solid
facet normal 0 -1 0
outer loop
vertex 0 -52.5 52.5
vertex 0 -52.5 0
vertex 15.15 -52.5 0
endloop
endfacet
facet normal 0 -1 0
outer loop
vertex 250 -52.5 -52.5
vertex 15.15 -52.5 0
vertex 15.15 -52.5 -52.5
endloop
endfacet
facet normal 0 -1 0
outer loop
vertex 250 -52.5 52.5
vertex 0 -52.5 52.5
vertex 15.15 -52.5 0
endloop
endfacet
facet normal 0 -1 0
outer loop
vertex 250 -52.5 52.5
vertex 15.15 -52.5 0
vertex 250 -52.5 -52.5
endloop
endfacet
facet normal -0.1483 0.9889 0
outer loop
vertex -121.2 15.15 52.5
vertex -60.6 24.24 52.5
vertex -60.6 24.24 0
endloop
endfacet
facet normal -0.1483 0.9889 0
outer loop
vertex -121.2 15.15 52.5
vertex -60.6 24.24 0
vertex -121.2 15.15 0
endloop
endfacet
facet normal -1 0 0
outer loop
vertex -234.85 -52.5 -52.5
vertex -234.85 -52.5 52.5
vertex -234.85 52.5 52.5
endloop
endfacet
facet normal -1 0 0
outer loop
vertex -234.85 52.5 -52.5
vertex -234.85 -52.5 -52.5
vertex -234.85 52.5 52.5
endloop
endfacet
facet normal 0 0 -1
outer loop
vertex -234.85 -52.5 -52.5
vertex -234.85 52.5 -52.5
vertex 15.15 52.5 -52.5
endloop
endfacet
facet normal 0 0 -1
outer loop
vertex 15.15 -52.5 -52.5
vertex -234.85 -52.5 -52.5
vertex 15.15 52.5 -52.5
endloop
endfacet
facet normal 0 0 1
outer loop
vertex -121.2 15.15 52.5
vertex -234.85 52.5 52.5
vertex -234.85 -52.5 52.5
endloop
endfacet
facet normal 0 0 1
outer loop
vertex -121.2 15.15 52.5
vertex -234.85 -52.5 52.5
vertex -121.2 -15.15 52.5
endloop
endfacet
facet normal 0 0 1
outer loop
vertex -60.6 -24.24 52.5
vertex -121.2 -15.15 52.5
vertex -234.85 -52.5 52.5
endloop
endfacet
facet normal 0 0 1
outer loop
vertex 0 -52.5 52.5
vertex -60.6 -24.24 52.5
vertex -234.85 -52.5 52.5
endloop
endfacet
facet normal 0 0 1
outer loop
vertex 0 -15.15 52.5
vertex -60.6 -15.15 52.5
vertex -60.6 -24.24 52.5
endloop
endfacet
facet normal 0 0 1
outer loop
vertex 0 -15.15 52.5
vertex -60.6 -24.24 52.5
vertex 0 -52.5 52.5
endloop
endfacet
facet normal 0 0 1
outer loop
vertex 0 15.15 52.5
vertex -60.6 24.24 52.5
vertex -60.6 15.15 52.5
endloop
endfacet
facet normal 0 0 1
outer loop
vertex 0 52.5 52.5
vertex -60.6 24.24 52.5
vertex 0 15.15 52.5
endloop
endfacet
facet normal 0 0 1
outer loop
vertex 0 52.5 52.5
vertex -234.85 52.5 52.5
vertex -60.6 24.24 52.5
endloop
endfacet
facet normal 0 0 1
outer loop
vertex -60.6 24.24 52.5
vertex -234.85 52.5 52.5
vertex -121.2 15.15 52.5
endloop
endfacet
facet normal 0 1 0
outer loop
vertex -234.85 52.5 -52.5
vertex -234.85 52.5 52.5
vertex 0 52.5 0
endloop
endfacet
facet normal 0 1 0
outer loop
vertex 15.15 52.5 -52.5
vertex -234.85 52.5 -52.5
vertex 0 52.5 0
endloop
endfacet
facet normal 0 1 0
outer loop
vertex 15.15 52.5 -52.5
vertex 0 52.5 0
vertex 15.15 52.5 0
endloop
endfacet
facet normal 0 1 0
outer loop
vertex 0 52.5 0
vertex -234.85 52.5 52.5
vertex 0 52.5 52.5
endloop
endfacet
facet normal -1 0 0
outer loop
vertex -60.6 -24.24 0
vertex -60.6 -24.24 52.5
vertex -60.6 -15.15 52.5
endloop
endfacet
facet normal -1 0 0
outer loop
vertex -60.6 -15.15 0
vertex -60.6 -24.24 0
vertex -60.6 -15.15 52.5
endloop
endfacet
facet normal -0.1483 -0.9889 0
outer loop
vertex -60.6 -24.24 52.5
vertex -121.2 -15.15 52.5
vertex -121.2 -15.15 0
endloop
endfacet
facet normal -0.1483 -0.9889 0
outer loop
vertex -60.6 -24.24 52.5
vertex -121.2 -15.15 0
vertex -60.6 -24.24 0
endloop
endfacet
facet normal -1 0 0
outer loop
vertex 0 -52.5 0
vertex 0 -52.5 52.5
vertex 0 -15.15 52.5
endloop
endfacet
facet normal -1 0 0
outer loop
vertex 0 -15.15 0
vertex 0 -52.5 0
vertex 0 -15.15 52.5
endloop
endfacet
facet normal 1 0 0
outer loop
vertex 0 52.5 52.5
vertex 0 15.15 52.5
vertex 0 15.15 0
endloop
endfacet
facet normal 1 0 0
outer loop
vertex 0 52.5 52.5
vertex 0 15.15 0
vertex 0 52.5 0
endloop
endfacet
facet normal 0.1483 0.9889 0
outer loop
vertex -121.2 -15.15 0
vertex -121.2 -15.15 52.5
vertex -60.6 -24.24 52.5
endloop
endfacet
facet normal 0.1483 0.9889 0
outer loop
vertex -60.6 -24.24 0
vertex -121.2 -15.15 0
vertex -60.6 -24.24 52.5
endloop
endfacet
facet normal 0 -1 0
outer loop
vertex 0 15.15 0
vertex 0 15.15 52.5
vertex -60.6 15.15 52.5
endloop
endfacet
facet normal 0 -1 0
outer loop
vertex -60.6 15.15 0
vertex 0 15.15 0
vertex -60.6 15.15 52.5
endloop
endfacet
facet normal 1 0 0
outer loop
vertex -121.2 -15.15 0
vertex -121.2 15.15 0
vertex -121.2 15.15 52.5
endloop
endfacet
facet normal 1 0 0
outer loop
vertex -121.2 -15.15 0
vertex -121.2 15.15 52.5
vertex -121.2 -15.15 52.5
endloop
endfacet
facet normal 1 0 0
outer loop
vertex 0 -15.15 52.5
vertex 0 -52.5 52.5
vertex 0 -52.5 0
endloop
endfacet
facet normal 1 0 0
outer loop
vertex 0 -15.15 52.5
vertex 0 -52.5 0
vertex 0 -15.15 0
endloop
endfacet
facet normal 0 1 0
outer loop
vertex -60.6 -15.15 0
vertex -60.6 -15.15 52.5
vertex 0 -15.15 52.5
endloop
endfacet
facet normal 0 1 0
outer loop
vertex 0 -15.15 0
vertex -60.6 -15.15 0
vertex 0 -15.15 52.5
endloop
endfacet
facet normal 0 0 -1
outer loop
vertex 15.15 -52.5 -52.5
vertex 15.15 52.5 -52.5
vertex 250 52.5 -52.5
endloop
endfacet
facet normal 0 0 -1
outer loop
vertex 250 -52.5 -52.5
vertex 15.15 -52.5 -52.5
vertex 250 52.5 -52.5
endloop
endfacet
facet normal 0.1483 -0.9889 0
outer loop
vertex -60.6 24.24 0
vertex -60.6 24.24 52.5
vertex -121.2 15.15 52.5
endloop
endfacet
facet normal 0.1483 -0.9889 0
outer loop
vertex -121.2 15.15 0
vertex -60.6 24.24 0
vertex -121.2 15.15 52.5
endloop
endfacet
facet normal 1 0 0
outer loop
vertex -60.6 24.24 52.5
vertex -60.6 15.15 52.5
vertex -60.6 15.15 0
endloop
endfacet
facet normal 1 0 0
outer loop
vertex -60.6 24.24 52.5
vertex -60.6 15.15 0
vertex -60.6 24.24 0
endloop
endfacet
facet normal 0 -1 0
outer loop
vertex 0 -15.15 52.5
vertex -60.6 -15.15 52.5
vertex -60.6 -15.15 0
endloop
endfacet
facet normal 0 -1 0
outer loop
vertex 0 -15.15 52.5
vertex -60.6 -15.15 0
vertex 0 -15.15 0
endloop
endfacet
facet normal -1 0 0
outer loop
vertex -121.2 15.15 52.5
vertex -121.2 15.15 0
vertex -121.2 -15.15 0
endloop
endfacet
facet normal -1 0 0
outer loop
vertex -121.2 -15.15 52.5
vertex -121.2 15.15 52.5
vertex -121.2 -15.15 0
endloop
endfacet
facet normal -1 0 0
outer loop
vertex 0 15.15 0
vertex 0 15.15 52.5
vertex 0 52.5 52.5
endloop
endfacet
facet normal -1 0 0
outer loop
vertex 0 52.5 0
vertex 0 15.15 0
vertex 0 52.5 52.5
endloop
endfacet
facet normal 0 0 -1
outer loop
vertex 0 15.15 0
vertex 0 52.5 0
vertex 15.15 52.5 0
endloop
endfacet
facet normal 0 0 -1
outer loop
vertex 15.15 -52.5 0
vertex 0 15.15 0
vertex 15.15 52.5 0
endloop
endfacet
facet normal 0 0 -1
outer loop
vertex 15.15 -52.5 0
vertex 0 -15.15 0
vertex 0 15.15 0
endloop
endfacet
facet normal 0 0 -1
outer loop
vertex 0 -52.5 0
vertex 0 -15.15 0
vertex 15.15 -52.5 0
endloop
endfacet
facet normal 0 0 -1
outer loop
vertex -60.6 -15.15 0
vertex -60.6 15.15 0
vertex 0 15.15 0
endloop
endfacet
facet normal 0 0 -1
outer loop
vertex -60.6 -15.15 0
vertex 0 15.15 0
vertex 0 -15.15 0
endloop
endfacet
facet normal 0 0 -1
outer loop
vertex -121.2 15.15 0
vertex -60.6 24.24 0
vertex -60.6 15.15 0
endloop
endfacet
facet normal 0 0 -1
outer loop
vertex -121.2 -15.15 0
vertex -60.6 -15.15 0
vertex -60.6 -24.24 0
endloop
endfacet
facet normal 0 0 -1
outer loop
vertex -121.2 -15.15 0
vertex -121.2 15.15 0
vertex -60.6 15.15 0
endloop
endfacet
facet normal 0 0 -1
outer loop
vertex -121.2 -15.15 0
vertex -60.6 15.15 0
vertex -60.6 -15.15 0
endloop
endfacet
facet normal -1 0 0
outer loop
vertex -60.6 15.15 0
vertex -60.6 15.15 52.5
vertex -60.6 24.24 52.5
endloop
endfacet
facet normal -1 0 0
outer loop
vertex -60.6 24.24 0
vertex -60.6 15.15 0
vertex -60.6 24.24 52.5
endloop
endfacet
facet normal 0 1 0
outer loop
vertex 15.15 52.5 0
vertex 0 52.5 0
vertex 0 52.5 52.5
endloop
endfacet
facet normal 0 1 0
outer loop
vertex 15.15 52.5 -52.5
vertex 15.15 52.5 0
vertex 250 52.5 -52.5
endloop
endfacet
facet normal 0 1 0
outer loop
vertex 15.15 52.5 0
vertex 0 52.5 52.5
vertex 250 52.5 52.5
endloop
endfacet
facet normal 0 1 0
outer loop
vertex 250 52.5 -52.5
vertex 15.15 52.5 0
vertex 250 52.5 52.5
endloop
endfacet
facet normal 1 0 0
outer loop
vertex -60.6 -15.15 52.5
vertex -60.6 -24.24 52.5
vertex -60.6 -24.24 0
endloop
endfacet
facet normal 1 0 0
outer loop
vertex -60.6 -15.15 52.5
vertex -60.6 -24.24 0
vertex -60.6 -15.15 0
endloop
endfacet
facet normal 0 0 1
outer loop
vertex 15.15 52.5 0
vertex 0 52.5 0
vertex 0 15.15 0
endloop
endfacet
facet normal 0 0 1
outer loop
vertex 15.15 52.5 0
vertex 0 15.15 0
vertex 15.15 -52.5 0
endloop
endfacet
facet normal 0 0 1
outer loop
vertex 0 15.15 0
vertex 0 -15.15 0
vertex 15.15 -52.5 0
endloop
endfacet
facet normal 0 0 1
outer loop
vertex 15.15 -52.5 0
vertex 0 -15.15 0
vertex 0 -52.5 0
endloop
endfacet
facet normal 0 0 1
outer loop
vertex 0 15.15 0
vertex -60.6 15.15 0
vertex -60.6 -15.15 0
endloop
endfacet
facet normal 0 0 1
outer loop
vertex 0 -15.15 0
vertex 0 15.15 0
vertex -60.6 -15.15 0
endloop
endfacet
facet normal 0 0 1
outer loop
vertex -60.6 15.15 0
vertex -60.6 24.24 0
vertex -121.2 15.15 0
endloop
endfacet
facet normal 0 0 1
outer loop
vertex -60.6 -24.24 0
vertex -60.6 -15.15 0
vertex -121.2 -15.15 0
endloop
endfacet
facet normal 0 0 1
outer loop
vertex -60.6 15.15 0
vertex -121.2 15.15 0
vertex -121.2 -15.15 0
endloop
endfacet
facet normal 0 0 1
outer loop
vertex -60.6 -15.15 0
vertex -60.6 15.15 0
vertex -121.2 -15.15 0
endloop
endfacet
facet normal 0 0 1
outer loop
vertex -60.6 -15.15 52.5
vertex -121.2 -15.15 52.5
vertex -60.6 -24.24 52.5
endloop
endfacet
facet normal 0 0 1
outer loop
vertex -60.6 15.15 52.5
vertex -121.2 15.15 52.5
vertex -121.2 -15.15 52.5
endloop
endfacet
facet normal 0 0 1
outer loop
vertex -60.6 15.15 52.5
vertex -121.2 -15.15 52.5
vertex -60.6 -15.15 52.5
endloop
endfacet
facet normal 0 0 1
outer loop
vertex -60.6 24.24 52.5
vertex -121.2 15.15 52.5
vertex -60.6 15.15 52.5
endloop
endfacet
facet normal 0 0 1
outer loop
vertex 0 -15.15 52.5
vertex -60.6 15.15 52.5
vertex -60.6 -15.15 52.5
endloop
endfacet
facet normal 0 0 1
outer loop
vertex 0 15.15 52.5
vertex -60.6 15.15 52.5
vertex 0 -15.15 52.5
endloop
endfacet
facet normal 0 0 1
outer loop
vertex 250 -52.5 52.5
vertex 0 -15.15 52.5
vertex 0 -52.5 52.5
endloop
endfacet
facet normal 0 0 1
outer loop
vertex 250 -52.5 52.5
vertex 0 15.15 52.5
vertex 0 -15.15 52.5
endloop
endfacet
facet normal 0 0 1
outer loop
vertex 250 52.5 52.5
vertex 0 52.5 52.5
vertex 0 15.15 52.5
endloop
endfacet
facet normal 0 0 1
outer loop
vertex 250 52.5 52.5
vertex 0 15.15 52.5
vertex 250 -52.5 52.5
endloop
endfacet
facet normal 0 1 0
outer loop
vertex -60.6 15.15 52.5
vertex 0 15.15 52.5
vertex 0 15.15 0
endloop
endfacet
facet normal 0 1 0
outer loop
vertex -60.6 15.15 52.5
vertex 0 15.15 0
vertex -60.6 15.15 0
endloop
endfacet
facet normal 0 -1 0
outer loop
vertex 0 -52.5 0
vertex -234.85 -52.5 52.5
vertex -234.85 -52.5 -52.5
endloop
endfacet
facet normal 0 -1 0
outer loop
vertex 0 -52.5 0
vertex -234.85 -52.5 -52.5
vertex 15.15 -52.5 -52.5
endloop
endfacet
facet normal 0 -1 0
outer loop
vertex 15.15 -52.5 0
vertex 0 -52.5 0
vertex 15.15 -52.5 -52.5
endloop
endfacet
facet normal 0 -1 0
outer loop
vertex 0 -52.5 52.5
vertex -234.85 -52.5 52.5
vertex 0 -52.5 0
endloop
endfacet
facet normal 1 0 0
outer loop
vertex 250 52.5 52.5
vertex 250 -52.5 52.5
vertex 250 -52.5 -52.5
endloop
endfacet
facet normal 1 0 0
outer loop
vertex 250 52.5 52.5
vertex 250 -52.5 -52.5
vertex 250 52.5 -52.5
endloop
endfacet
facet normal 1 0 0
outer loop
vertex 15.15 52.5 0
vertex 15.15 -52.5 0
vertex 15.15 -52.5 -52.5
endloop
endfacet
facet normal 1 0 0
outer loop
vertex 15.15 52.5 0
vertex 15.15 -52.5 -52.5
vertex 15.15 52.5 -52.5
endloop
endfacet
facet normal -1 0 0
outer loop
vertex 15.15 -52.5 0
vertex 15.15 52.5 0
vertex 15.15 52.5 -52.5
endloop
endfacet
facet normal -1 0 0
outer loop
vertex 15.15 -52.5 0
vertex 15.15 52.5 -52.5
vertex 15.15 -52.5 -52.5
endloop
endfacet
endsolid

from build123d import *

# Parameters (mm, degrees)
F0_W          = 250
F0_H          = 105
F1_DEPTH      = 52.5
F2_W          = 105
F2_H          = 52.5
F3_DEPTH      = 15.15
F5_DEPTH      = 52.5
F6_W          = 250
F6_H          = 105
F7_DEPTH      = 52.5
F7_DEPTH_BACK = 52.5


with BuildPart() as f1:
    # F0 (on Top) → F1 (new body, symmetric)
    with BuildSketch(Plane.XY):
        with Locations((125, 0)):
            Rectangle(F0_W, F0_H)
    extrude(amount=F1_DEPTH, both=True)

    # F2 (on face) → F3 (cut)
    with BuildSketch(Plane(origin=(0, 0, 0), x_dir=(0, -1, 0), z_dir=(-1, 0, 0))):
        with Locations((0, -26.25)):
            Rectangle(F2_W, F2_H)
    extrude(amount=-F3_DEPTH, mode=Mode.SUBTRACT)

    # F4 (on face) → F5 (join, through all)
    with BuildSketch(Plane.XY.offset(52.5)):
        Polygon((0, -15.15), (0, 15.15), (-60.6, 15.15), (-60.6, 24.24), (-121.2, 15.15), (-121.2, -15.15), (-60.6, -24.24), (-60.6, -15.15), align=None)
    extrude(amount=-F5_DEPTH)


with BuildPart() as f7:
    # F6 (on Top) → F7 (new body, two sides)
    with BuildSketch(Plane.XY) as f7_sk:
        with Locations((-109.85, 0)):
            Rectangle(F6_W, F6_H)
    extrude(amount=F7_DEPTH)
    extrude(f7_sk.sketch, amount=-F7_DEPTH_BACK)

    # F8: cut F1
    add(f1.part, mode=Mode.SUBTRACT)


solid = Compound([f1.part, f7.part])
